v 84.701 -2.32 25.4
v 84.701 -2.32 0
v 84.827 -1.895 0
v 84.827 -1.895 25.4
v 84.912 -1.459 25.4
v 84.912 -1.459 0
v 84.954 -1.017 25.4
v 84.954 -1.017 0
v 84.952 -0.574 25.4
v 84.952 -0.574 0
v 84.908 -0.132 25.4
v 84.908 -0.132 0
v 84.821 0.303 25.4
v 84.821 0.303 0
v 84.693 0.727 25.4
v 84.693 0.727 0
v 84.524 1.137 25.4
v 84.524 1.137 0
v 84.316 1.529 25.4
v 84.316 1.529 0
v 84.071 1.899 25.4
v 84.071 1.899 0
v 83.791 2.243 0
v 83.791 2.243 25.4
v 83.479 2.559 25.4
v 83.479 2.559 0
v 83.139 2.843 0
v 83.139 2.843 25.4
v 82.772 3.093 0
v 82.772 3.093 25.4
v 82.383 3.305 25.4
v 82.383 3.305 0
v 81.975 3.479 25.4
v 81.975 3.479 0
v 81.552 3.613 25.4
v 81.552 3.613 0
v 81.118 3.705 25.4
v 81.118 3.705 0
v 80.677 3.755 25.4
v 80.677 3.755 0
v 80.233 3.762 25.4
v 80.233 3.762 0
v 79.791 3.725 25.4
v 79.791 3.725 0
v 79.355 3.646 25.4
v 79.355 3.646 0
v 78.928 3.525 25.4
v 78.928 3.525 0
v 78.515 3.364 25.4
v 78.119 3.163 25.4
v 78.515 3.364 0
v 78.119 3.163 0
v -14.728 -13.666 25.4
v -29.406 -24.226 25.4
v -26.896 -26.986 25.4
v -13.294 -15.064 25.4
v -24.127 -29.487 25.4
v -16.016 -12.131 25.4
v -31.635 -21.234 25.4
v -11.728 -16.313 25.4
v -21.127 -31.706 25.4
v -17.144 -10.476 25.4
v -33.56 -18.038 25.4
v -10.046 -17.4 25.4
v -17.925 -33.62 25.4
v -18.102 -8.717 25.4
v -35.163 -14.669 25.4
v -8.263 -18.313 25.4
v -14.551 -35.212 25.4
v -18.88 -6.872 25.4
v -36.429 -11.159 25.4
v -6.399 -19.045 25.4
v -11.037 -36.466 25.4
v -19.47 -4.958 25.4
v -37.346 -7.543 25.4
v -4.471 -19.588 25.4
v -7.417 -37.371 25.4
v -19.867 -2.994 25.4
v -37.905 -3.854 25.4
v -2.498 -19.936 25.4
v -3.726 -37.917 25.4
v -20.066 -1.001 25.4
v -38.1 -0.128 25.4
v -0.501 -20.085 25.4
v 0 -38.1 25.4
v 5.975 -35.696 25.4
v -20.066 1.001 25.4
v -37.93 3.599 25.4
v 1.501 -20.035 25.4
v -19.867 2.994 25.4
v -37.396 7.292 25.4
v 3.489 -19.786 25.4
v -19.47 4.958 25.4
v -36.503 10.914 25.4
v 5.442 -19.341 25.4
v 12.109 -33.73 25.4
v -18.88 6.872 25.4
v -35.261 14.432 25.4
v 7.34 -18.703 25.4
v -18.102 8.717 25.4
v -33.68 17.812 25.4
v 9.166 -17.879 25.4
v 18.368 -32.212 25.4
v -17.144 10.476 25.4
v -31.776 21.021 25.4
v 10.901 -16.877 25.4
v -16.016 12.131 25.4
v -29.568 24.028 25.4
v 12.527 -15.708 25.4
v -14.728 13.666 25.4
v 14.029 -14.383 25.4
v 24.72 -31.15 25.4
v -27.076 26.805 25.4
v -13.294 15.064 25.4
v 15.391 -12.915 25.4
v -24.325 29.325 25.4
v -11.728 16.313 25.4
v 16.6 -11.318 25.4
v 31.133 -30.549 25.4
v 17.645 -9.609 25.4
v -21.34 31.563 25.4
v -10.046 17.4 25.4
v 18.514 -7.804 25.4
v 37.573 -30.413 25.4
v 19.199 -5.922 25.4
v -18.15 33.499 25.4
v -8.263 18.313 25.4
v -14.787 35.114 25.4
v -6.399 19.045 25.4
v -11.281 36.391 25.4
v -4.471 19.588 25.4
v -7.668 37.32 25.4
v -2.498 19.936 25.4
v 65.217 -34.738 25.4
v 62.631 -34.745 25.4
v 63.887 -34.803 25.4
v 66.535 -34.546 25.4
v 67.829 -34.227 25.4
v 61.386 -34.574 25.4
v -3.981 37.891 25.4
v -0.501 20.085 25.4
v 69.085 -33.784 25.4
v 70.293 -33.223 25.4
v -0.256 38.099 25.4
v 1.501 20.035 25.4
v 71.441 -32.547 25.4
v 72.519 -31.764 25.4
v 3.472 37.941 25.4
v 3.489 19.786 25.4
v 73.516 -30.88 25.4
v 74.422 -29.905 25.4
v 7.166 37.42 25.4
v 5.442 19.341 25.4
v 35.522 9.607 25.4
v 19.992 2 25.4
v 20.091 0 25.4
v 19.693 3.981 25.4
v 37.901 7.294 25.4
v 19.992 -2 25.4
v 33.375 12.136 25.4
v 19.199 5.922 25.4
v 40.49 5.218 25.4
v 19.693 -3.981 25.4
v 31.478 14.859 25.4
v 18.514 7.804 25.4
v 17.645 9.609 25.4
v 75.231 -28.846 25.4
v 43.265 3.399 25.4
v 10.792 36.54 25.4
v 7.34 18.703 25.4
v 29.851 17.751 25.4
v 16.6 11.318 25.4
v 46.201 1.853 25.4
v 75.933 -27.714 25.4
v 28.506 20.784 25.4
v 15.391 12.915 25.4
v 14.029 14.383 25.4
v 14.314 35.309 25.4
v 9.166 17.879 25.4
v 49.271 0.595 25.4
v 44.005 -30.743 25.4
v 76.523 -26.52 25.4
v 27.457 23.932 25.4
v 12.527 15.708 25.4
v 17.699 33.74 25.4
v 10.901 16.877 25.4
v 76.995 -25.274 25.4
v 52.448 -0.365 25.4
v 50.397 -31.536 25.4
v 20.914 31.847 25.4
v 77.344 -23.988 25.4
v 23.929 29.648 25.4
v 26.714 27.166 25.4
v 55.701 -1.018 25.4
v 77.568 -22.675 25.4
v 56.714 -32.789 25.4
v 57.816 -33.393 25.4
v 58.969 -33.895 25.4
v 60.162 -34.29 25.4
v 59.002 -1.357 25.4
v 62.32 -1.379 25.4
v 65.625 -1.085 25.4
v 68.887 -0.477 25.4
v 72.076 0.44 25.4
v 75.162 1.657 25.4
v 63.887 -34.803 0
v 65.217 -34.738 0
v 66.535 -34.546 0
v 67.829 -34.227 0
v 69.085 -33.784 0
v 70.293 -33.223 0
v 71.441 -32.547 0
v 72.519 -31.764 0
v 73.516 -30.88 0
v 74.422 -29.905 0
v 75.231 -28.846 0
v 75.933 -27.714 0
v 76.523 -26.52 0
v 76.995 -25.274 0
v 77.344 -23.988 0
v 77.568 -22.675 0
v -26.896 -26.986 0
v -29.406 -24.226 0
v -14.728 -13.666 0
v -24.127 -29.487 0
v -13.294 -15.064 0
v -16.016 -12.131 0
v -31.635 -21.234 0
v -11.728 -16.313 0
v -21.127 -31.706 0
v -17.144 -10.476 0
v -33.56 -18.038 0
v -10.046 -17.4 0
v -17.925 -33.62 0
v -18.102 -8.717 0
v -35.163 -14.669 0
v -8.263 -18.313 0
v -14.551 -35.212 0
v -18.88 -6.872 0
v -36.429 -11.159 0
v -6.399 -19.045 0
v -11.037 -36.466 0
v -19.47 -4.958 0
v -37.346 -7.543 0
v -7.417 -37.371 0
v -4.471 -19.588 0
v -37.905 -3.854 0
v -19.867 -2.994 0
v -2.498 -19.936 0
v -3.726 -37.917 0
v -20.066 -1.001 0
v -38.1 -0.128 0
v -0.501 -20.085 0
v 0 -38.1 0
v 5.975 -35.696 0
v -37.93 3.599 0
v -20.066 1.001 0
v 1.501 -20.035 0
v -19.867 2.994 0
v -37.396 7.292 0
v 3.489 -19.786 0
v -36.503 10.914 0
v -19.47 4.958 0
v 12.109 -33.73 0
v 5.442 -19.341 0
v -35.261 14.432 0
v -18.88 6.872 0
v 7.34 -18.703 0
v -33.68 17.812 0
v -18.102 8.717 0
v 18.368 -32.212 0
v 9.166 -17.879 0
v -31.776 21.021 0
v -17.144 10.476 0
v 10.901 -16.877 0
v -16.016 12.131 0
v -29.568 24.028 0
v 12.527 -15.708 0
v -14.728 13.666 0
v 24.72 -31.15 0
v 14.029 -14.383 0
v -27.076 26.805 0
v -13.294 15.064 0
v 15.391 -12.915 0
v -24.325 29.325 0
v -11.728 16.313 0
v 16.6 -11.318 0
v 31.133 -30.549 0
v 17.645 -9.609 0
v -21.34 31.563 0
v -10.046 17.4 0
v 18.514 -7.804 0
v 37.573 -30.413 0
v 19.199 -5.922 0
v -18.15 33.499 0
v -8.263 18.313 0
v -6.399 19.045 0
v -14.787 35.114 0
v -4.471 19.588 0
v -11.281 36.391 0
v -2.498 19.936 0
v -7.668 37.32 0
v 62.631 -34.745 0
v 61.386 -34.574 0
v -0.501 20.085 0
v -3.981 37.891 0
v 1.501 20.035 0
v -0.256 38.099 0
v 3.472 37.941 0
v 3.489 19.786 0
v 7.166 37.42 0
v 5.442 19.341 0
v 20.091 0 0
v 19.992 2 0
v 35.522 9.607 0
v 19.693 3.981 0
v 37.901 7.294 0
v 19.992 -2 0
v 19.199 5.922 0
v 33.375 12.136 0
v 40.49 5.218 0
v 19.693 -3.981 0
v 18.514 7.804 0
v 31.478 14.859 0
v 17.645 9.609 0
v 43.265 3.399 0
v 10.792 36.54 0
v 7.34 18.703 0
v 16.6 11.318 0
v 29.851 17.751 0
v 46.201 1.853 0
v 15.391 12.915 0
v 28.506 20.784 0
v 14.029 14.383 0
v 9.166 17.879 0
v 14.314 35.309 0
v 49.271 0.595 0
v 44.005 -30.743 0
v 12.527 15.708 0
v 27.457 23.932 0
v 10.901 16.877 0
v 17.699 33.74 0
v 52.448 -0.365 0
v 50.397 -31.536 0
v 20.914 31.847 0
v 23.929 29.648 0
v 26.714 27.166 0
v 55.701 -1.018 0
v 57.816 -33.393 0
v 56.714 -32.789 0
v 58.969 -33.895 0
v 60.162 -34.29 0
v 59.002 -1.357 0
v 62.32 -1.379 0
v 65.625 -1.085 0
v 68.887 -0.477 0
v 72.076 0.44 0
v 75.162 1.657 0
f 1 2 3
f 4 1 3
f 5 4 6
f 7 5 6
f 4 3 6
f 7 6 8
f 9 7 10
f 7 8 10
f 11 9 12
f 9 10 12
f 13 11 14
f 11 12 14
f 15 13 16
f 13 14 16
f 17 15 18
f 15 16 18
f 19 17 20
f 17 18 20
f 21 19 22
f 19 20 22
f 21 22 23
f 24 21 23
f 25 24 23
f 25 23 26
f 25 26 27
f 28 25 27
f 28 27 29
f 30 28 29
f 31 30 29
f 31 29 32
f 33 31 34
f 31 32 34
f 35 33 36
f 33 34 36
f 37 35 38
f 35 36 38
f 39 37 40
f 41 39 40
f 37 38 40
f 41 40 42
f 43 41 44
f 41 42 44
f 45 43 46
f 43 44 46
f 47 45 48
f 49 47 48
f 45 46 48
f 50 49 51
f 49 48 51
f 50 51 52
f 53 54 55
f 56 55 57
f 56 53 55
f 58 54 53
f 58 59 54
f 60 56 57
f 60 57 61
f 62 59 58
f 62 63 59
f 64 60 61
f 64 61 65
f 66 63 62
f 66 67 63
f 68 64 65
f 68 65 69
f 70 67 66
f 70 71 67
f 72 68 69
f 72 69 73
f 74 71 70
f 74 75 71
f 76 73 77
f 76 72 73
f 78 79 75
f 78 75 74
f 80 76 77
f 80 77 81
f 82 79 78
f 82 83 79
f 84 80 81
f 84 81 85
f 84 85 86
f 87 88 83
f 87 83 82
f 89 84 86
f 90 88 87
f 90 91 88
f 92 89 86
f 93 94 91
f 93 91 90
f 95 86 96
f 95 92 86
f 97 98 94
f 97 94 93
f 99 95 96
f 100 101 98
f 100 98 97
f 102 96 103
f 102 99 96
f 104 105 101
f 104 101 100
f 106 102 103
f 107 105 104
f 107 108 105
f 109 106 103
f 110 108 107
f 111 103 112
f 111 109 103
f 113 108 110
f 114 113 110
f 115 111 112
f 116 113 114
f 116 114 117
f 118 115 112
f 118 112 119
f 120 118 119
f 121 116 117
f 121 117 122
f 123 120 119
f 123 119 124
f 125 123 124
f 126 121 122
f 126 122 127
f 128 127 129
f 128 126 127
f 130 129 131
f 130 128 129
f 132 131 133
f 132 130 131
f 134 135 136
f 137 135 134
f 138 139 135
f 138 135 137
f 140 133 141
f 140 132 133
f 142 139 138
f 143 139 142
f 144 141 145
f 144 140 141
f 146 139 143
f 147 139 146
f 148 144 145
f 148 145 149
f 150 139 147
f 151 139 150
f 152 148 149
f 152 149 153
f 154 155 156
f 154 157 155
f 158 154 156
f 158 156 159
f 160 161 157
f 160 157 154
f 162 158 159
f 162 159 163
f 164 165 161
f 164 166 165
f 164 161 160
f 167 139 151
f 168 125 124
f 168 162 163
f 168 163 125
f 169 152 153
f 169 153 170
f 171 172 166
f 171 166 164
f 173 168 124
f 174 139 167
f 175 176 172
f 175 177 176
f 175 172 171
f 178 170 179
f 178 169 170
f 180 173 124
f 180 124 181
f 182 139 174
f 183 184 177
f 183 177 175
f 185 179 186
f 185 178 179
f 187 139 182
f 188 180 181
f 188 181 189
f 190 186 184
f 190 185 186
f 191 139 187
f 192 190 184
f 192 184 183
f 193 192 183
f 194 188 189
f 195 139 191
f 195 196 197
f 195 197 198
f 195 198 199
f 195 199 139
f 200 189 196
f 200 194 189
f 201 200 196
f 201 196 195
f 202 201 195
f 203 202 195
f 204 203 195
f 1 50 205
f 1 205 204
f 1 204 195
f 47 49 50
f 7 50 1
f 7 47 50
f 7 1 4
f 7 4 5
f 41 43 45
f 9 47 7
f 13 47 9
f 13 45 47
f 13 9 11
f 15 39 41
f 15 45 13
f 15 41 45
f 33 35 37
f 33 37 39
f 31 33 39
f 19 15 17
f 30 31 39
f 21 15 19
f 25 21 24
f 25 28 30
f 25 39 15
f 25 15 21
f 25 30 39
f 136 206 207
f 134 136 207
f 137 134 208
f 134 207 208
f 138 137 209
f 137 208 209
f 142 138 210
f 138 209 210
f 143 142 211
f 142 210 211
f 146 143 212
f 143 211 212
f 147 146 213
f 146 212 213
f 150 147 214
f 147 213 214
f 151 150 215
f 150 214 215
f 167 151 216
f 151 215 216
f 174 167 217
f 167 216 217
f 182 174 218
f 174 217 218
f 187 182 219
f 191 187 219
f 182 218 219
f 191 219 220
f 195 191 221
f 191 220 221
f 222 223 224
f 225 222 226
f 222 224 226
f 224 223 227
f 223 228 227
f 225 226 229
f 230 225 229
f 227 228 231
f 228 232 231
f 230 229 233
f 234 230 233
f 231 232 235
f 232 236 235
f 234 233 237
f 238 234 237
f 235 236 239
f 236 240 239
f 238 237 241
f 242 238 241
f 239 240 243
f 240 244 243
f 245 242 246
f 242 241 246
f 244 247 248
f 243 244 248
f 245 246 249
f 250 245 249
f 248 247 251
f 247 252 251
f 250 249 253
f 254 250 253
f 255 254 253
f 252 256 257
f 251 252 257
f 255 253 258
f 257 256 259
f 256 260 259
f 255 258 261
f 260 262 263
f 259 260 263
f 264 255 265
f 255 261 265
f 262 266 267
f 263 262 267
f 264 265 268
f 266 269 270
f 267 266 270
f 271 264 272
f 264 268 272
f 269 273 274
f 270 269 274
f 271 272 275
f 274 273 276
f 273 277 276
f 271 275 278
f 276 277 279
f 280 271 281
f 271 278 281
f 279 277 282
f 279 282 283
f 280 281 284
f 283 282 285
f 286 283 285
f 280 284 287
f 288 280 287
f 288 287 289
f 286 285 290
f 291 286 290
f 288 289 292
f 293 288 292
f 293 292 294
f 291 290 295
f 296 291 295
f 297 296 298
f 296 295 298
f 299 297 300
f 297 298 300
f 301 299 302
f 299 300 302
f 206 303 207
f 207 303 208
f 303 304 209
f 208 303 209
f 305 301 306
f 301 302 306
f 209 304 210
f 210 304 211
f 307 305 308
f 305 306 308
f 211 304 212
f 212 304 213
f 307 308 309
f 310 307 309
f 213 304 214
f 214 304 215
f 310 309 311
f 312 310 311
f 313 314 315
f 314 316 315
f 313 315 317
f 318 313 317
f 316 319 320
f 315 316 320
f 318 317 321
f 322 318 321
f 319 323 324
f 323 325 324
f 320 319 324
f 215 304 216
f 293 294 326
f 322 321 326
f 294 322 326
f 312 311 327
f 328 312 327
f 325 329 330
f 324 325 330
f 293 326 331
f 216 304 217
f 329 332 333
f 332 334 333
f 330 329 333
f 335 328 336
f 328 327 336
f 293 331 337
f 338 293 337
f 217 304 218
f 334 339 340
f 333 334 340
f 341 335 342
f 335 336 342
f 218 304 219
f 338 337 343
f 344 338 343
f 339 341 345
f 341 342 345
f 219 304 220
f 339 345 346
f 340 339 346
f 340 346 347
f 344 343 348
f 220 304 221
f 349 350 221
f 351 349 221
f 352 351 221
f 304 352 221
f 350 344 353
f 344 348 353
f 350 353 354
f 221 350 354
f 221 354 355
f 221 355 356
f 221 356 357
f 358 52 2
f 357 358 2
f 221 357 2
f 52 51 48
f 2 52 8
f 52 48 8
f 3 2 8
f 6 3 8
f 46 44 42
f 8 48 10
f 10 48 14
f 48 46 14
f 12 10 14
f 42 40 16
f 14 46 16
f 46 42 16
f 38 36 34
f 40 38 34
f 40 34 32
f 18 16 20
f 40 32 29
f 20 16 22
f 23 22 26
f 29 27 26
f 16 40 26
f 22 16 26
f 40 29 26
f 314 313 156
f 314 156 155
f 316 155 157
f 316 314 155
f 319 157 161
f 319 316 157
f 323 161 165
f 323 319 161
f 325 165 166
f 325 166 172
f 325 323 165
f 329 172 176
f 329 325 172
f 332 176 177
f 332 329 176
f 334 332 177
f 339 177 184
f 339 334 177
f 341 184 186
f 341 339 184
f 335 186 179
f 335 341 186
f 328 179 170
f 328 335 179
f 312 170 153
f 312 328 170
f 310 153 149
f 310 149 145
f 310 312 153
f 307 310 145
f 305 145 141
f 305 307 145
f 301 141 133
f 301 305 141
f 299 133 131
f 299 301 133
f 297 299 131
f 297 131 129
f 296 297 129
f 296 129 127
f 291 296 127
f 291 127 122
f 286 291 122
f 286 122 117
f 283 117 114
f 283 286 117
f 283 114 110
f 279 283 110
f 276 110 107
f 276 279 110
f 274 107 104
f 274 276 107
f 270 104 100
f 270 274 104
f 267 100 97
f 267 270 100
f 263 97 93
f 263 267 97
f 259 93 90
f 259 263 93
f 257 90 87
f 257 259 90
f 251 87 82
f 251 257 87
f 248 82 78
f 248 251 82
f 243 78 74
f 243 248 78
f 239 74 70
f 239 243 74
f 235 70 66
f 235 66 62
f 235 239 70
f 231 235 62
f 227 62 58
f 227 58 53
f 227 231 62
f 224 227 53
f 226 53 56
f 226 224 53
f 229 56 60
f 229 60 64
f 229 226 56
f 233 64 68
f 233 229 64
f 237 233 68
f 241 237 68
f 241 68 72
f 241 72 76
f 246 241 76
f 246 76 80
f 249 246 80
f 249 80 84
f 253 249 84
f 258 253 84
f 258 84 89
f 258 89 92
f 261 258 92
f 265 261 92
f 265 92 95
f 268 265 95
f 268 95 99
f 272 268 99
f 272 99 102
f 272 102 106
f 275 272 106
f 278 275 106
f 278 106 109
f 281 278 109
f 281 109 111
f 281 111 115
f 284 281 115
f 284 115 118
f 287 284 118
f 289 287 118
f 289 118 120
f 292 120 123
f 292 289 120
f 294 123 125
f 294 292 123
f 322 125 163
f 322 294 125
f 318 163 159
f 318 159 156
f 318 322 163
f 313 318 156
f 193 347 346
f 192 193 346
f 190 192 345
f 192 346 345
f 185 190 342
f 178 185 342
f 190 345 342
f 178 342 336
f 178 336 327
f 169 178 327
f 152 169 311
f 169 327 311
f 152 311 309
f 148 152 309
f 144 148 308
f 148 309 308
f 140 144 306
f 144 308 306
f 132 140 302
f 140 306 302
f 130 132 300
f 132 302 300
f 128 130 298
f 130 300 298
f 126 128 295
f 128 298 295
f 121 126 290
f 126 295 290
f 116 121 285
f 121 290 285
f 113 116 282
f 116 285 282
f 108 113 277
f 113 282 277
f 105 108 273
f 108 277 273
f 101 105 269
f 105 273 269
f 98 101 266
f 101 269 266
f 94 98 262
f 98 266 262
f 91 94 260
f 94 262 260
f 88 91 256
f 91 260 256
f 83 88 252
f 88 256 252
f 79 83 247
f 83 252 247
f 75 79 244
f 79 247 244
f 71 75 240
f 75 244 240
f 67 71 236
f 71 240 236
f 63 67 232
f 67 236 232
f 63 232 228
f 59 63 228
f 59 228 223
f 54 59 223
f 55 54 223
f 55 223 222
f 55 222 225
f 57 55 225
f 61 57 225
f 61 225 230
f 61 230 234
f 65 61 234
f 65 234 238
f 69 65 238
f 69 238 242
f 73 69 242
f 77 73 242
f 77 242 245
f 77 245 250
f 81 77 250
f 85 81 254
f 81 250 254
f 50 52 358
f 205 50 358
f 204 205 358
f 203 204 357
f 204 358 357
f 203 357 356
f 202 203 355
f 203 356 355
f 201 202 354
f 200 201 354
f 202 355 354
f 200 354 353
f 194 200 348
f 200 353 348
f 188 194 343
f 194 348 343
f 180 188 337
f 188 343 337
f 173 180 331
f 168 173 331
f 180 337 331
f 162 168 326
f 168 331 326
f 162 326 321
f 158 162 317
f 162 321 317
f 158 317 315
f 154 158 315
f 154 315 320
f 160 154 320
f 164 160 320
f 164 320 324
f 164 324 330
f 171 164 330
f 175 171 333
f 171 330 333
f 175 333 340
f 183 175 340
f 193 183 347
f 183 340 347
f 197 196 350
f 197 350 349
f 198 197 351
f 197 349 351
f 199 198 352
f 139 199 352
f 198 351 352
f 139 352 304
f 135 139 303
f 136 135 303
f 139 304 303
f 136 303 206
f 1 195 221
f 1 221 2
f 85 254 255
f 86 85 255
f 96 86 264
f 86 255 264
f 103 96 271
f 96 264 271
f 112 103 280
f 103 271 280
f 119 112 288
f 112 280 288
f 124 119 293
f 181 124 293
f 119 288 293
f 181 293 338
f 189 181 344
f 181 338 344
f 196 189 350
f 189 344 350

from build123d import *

# Parameters (mm, degrees)
F0_R     = 20.091447
F1_DEPTH = 25.4


with BuildPart() as f1:
    # F0 (on Top) → F1 (new body)
    with BuildSketch(Plane.XY):
        with BuildLine():
            ThreePointArc((78.119229, 3.16254), (46.20116, 1.853494), (26.713748, 27.165892))
            ThreePointArc((26.713748, 27.165892), (-35.260676, 14.43242), (0, -38.1))
            ThreePointArc((0, -38.1), (27.921411, -30.791494), (56.714284, -32.78896))
            ThreePointArc((56.714284, -32.78896), (60.321561, -33.720822), (63.88674, -34.802633))
            ThreePointArc((63.88674, -34.802633), (73.027903, -31.334338), (77.567758, -22.67526))
            Line((77.567758, -22.67526), (84.701062, -2.319822))
            ThreePointArc((84.701062, -2.319822), (83.312466, 2.705184), (78.119229, 3.16254))
        make_face()
        Circle(F0_R, mode=Mode.SUBTRACT)
        with BuildLine():
            ThreePointArc((63.88674, -34.802633), (60.321561, -33.720822), (56.714284, -32.78896))
            ThreePointArc((56.714284, -32.78896), (60.161857, -34.289667), (63.88674, -34.802633))
        make_face()
    extrude(amount=F1_DEPTH)


solid = f1.part
